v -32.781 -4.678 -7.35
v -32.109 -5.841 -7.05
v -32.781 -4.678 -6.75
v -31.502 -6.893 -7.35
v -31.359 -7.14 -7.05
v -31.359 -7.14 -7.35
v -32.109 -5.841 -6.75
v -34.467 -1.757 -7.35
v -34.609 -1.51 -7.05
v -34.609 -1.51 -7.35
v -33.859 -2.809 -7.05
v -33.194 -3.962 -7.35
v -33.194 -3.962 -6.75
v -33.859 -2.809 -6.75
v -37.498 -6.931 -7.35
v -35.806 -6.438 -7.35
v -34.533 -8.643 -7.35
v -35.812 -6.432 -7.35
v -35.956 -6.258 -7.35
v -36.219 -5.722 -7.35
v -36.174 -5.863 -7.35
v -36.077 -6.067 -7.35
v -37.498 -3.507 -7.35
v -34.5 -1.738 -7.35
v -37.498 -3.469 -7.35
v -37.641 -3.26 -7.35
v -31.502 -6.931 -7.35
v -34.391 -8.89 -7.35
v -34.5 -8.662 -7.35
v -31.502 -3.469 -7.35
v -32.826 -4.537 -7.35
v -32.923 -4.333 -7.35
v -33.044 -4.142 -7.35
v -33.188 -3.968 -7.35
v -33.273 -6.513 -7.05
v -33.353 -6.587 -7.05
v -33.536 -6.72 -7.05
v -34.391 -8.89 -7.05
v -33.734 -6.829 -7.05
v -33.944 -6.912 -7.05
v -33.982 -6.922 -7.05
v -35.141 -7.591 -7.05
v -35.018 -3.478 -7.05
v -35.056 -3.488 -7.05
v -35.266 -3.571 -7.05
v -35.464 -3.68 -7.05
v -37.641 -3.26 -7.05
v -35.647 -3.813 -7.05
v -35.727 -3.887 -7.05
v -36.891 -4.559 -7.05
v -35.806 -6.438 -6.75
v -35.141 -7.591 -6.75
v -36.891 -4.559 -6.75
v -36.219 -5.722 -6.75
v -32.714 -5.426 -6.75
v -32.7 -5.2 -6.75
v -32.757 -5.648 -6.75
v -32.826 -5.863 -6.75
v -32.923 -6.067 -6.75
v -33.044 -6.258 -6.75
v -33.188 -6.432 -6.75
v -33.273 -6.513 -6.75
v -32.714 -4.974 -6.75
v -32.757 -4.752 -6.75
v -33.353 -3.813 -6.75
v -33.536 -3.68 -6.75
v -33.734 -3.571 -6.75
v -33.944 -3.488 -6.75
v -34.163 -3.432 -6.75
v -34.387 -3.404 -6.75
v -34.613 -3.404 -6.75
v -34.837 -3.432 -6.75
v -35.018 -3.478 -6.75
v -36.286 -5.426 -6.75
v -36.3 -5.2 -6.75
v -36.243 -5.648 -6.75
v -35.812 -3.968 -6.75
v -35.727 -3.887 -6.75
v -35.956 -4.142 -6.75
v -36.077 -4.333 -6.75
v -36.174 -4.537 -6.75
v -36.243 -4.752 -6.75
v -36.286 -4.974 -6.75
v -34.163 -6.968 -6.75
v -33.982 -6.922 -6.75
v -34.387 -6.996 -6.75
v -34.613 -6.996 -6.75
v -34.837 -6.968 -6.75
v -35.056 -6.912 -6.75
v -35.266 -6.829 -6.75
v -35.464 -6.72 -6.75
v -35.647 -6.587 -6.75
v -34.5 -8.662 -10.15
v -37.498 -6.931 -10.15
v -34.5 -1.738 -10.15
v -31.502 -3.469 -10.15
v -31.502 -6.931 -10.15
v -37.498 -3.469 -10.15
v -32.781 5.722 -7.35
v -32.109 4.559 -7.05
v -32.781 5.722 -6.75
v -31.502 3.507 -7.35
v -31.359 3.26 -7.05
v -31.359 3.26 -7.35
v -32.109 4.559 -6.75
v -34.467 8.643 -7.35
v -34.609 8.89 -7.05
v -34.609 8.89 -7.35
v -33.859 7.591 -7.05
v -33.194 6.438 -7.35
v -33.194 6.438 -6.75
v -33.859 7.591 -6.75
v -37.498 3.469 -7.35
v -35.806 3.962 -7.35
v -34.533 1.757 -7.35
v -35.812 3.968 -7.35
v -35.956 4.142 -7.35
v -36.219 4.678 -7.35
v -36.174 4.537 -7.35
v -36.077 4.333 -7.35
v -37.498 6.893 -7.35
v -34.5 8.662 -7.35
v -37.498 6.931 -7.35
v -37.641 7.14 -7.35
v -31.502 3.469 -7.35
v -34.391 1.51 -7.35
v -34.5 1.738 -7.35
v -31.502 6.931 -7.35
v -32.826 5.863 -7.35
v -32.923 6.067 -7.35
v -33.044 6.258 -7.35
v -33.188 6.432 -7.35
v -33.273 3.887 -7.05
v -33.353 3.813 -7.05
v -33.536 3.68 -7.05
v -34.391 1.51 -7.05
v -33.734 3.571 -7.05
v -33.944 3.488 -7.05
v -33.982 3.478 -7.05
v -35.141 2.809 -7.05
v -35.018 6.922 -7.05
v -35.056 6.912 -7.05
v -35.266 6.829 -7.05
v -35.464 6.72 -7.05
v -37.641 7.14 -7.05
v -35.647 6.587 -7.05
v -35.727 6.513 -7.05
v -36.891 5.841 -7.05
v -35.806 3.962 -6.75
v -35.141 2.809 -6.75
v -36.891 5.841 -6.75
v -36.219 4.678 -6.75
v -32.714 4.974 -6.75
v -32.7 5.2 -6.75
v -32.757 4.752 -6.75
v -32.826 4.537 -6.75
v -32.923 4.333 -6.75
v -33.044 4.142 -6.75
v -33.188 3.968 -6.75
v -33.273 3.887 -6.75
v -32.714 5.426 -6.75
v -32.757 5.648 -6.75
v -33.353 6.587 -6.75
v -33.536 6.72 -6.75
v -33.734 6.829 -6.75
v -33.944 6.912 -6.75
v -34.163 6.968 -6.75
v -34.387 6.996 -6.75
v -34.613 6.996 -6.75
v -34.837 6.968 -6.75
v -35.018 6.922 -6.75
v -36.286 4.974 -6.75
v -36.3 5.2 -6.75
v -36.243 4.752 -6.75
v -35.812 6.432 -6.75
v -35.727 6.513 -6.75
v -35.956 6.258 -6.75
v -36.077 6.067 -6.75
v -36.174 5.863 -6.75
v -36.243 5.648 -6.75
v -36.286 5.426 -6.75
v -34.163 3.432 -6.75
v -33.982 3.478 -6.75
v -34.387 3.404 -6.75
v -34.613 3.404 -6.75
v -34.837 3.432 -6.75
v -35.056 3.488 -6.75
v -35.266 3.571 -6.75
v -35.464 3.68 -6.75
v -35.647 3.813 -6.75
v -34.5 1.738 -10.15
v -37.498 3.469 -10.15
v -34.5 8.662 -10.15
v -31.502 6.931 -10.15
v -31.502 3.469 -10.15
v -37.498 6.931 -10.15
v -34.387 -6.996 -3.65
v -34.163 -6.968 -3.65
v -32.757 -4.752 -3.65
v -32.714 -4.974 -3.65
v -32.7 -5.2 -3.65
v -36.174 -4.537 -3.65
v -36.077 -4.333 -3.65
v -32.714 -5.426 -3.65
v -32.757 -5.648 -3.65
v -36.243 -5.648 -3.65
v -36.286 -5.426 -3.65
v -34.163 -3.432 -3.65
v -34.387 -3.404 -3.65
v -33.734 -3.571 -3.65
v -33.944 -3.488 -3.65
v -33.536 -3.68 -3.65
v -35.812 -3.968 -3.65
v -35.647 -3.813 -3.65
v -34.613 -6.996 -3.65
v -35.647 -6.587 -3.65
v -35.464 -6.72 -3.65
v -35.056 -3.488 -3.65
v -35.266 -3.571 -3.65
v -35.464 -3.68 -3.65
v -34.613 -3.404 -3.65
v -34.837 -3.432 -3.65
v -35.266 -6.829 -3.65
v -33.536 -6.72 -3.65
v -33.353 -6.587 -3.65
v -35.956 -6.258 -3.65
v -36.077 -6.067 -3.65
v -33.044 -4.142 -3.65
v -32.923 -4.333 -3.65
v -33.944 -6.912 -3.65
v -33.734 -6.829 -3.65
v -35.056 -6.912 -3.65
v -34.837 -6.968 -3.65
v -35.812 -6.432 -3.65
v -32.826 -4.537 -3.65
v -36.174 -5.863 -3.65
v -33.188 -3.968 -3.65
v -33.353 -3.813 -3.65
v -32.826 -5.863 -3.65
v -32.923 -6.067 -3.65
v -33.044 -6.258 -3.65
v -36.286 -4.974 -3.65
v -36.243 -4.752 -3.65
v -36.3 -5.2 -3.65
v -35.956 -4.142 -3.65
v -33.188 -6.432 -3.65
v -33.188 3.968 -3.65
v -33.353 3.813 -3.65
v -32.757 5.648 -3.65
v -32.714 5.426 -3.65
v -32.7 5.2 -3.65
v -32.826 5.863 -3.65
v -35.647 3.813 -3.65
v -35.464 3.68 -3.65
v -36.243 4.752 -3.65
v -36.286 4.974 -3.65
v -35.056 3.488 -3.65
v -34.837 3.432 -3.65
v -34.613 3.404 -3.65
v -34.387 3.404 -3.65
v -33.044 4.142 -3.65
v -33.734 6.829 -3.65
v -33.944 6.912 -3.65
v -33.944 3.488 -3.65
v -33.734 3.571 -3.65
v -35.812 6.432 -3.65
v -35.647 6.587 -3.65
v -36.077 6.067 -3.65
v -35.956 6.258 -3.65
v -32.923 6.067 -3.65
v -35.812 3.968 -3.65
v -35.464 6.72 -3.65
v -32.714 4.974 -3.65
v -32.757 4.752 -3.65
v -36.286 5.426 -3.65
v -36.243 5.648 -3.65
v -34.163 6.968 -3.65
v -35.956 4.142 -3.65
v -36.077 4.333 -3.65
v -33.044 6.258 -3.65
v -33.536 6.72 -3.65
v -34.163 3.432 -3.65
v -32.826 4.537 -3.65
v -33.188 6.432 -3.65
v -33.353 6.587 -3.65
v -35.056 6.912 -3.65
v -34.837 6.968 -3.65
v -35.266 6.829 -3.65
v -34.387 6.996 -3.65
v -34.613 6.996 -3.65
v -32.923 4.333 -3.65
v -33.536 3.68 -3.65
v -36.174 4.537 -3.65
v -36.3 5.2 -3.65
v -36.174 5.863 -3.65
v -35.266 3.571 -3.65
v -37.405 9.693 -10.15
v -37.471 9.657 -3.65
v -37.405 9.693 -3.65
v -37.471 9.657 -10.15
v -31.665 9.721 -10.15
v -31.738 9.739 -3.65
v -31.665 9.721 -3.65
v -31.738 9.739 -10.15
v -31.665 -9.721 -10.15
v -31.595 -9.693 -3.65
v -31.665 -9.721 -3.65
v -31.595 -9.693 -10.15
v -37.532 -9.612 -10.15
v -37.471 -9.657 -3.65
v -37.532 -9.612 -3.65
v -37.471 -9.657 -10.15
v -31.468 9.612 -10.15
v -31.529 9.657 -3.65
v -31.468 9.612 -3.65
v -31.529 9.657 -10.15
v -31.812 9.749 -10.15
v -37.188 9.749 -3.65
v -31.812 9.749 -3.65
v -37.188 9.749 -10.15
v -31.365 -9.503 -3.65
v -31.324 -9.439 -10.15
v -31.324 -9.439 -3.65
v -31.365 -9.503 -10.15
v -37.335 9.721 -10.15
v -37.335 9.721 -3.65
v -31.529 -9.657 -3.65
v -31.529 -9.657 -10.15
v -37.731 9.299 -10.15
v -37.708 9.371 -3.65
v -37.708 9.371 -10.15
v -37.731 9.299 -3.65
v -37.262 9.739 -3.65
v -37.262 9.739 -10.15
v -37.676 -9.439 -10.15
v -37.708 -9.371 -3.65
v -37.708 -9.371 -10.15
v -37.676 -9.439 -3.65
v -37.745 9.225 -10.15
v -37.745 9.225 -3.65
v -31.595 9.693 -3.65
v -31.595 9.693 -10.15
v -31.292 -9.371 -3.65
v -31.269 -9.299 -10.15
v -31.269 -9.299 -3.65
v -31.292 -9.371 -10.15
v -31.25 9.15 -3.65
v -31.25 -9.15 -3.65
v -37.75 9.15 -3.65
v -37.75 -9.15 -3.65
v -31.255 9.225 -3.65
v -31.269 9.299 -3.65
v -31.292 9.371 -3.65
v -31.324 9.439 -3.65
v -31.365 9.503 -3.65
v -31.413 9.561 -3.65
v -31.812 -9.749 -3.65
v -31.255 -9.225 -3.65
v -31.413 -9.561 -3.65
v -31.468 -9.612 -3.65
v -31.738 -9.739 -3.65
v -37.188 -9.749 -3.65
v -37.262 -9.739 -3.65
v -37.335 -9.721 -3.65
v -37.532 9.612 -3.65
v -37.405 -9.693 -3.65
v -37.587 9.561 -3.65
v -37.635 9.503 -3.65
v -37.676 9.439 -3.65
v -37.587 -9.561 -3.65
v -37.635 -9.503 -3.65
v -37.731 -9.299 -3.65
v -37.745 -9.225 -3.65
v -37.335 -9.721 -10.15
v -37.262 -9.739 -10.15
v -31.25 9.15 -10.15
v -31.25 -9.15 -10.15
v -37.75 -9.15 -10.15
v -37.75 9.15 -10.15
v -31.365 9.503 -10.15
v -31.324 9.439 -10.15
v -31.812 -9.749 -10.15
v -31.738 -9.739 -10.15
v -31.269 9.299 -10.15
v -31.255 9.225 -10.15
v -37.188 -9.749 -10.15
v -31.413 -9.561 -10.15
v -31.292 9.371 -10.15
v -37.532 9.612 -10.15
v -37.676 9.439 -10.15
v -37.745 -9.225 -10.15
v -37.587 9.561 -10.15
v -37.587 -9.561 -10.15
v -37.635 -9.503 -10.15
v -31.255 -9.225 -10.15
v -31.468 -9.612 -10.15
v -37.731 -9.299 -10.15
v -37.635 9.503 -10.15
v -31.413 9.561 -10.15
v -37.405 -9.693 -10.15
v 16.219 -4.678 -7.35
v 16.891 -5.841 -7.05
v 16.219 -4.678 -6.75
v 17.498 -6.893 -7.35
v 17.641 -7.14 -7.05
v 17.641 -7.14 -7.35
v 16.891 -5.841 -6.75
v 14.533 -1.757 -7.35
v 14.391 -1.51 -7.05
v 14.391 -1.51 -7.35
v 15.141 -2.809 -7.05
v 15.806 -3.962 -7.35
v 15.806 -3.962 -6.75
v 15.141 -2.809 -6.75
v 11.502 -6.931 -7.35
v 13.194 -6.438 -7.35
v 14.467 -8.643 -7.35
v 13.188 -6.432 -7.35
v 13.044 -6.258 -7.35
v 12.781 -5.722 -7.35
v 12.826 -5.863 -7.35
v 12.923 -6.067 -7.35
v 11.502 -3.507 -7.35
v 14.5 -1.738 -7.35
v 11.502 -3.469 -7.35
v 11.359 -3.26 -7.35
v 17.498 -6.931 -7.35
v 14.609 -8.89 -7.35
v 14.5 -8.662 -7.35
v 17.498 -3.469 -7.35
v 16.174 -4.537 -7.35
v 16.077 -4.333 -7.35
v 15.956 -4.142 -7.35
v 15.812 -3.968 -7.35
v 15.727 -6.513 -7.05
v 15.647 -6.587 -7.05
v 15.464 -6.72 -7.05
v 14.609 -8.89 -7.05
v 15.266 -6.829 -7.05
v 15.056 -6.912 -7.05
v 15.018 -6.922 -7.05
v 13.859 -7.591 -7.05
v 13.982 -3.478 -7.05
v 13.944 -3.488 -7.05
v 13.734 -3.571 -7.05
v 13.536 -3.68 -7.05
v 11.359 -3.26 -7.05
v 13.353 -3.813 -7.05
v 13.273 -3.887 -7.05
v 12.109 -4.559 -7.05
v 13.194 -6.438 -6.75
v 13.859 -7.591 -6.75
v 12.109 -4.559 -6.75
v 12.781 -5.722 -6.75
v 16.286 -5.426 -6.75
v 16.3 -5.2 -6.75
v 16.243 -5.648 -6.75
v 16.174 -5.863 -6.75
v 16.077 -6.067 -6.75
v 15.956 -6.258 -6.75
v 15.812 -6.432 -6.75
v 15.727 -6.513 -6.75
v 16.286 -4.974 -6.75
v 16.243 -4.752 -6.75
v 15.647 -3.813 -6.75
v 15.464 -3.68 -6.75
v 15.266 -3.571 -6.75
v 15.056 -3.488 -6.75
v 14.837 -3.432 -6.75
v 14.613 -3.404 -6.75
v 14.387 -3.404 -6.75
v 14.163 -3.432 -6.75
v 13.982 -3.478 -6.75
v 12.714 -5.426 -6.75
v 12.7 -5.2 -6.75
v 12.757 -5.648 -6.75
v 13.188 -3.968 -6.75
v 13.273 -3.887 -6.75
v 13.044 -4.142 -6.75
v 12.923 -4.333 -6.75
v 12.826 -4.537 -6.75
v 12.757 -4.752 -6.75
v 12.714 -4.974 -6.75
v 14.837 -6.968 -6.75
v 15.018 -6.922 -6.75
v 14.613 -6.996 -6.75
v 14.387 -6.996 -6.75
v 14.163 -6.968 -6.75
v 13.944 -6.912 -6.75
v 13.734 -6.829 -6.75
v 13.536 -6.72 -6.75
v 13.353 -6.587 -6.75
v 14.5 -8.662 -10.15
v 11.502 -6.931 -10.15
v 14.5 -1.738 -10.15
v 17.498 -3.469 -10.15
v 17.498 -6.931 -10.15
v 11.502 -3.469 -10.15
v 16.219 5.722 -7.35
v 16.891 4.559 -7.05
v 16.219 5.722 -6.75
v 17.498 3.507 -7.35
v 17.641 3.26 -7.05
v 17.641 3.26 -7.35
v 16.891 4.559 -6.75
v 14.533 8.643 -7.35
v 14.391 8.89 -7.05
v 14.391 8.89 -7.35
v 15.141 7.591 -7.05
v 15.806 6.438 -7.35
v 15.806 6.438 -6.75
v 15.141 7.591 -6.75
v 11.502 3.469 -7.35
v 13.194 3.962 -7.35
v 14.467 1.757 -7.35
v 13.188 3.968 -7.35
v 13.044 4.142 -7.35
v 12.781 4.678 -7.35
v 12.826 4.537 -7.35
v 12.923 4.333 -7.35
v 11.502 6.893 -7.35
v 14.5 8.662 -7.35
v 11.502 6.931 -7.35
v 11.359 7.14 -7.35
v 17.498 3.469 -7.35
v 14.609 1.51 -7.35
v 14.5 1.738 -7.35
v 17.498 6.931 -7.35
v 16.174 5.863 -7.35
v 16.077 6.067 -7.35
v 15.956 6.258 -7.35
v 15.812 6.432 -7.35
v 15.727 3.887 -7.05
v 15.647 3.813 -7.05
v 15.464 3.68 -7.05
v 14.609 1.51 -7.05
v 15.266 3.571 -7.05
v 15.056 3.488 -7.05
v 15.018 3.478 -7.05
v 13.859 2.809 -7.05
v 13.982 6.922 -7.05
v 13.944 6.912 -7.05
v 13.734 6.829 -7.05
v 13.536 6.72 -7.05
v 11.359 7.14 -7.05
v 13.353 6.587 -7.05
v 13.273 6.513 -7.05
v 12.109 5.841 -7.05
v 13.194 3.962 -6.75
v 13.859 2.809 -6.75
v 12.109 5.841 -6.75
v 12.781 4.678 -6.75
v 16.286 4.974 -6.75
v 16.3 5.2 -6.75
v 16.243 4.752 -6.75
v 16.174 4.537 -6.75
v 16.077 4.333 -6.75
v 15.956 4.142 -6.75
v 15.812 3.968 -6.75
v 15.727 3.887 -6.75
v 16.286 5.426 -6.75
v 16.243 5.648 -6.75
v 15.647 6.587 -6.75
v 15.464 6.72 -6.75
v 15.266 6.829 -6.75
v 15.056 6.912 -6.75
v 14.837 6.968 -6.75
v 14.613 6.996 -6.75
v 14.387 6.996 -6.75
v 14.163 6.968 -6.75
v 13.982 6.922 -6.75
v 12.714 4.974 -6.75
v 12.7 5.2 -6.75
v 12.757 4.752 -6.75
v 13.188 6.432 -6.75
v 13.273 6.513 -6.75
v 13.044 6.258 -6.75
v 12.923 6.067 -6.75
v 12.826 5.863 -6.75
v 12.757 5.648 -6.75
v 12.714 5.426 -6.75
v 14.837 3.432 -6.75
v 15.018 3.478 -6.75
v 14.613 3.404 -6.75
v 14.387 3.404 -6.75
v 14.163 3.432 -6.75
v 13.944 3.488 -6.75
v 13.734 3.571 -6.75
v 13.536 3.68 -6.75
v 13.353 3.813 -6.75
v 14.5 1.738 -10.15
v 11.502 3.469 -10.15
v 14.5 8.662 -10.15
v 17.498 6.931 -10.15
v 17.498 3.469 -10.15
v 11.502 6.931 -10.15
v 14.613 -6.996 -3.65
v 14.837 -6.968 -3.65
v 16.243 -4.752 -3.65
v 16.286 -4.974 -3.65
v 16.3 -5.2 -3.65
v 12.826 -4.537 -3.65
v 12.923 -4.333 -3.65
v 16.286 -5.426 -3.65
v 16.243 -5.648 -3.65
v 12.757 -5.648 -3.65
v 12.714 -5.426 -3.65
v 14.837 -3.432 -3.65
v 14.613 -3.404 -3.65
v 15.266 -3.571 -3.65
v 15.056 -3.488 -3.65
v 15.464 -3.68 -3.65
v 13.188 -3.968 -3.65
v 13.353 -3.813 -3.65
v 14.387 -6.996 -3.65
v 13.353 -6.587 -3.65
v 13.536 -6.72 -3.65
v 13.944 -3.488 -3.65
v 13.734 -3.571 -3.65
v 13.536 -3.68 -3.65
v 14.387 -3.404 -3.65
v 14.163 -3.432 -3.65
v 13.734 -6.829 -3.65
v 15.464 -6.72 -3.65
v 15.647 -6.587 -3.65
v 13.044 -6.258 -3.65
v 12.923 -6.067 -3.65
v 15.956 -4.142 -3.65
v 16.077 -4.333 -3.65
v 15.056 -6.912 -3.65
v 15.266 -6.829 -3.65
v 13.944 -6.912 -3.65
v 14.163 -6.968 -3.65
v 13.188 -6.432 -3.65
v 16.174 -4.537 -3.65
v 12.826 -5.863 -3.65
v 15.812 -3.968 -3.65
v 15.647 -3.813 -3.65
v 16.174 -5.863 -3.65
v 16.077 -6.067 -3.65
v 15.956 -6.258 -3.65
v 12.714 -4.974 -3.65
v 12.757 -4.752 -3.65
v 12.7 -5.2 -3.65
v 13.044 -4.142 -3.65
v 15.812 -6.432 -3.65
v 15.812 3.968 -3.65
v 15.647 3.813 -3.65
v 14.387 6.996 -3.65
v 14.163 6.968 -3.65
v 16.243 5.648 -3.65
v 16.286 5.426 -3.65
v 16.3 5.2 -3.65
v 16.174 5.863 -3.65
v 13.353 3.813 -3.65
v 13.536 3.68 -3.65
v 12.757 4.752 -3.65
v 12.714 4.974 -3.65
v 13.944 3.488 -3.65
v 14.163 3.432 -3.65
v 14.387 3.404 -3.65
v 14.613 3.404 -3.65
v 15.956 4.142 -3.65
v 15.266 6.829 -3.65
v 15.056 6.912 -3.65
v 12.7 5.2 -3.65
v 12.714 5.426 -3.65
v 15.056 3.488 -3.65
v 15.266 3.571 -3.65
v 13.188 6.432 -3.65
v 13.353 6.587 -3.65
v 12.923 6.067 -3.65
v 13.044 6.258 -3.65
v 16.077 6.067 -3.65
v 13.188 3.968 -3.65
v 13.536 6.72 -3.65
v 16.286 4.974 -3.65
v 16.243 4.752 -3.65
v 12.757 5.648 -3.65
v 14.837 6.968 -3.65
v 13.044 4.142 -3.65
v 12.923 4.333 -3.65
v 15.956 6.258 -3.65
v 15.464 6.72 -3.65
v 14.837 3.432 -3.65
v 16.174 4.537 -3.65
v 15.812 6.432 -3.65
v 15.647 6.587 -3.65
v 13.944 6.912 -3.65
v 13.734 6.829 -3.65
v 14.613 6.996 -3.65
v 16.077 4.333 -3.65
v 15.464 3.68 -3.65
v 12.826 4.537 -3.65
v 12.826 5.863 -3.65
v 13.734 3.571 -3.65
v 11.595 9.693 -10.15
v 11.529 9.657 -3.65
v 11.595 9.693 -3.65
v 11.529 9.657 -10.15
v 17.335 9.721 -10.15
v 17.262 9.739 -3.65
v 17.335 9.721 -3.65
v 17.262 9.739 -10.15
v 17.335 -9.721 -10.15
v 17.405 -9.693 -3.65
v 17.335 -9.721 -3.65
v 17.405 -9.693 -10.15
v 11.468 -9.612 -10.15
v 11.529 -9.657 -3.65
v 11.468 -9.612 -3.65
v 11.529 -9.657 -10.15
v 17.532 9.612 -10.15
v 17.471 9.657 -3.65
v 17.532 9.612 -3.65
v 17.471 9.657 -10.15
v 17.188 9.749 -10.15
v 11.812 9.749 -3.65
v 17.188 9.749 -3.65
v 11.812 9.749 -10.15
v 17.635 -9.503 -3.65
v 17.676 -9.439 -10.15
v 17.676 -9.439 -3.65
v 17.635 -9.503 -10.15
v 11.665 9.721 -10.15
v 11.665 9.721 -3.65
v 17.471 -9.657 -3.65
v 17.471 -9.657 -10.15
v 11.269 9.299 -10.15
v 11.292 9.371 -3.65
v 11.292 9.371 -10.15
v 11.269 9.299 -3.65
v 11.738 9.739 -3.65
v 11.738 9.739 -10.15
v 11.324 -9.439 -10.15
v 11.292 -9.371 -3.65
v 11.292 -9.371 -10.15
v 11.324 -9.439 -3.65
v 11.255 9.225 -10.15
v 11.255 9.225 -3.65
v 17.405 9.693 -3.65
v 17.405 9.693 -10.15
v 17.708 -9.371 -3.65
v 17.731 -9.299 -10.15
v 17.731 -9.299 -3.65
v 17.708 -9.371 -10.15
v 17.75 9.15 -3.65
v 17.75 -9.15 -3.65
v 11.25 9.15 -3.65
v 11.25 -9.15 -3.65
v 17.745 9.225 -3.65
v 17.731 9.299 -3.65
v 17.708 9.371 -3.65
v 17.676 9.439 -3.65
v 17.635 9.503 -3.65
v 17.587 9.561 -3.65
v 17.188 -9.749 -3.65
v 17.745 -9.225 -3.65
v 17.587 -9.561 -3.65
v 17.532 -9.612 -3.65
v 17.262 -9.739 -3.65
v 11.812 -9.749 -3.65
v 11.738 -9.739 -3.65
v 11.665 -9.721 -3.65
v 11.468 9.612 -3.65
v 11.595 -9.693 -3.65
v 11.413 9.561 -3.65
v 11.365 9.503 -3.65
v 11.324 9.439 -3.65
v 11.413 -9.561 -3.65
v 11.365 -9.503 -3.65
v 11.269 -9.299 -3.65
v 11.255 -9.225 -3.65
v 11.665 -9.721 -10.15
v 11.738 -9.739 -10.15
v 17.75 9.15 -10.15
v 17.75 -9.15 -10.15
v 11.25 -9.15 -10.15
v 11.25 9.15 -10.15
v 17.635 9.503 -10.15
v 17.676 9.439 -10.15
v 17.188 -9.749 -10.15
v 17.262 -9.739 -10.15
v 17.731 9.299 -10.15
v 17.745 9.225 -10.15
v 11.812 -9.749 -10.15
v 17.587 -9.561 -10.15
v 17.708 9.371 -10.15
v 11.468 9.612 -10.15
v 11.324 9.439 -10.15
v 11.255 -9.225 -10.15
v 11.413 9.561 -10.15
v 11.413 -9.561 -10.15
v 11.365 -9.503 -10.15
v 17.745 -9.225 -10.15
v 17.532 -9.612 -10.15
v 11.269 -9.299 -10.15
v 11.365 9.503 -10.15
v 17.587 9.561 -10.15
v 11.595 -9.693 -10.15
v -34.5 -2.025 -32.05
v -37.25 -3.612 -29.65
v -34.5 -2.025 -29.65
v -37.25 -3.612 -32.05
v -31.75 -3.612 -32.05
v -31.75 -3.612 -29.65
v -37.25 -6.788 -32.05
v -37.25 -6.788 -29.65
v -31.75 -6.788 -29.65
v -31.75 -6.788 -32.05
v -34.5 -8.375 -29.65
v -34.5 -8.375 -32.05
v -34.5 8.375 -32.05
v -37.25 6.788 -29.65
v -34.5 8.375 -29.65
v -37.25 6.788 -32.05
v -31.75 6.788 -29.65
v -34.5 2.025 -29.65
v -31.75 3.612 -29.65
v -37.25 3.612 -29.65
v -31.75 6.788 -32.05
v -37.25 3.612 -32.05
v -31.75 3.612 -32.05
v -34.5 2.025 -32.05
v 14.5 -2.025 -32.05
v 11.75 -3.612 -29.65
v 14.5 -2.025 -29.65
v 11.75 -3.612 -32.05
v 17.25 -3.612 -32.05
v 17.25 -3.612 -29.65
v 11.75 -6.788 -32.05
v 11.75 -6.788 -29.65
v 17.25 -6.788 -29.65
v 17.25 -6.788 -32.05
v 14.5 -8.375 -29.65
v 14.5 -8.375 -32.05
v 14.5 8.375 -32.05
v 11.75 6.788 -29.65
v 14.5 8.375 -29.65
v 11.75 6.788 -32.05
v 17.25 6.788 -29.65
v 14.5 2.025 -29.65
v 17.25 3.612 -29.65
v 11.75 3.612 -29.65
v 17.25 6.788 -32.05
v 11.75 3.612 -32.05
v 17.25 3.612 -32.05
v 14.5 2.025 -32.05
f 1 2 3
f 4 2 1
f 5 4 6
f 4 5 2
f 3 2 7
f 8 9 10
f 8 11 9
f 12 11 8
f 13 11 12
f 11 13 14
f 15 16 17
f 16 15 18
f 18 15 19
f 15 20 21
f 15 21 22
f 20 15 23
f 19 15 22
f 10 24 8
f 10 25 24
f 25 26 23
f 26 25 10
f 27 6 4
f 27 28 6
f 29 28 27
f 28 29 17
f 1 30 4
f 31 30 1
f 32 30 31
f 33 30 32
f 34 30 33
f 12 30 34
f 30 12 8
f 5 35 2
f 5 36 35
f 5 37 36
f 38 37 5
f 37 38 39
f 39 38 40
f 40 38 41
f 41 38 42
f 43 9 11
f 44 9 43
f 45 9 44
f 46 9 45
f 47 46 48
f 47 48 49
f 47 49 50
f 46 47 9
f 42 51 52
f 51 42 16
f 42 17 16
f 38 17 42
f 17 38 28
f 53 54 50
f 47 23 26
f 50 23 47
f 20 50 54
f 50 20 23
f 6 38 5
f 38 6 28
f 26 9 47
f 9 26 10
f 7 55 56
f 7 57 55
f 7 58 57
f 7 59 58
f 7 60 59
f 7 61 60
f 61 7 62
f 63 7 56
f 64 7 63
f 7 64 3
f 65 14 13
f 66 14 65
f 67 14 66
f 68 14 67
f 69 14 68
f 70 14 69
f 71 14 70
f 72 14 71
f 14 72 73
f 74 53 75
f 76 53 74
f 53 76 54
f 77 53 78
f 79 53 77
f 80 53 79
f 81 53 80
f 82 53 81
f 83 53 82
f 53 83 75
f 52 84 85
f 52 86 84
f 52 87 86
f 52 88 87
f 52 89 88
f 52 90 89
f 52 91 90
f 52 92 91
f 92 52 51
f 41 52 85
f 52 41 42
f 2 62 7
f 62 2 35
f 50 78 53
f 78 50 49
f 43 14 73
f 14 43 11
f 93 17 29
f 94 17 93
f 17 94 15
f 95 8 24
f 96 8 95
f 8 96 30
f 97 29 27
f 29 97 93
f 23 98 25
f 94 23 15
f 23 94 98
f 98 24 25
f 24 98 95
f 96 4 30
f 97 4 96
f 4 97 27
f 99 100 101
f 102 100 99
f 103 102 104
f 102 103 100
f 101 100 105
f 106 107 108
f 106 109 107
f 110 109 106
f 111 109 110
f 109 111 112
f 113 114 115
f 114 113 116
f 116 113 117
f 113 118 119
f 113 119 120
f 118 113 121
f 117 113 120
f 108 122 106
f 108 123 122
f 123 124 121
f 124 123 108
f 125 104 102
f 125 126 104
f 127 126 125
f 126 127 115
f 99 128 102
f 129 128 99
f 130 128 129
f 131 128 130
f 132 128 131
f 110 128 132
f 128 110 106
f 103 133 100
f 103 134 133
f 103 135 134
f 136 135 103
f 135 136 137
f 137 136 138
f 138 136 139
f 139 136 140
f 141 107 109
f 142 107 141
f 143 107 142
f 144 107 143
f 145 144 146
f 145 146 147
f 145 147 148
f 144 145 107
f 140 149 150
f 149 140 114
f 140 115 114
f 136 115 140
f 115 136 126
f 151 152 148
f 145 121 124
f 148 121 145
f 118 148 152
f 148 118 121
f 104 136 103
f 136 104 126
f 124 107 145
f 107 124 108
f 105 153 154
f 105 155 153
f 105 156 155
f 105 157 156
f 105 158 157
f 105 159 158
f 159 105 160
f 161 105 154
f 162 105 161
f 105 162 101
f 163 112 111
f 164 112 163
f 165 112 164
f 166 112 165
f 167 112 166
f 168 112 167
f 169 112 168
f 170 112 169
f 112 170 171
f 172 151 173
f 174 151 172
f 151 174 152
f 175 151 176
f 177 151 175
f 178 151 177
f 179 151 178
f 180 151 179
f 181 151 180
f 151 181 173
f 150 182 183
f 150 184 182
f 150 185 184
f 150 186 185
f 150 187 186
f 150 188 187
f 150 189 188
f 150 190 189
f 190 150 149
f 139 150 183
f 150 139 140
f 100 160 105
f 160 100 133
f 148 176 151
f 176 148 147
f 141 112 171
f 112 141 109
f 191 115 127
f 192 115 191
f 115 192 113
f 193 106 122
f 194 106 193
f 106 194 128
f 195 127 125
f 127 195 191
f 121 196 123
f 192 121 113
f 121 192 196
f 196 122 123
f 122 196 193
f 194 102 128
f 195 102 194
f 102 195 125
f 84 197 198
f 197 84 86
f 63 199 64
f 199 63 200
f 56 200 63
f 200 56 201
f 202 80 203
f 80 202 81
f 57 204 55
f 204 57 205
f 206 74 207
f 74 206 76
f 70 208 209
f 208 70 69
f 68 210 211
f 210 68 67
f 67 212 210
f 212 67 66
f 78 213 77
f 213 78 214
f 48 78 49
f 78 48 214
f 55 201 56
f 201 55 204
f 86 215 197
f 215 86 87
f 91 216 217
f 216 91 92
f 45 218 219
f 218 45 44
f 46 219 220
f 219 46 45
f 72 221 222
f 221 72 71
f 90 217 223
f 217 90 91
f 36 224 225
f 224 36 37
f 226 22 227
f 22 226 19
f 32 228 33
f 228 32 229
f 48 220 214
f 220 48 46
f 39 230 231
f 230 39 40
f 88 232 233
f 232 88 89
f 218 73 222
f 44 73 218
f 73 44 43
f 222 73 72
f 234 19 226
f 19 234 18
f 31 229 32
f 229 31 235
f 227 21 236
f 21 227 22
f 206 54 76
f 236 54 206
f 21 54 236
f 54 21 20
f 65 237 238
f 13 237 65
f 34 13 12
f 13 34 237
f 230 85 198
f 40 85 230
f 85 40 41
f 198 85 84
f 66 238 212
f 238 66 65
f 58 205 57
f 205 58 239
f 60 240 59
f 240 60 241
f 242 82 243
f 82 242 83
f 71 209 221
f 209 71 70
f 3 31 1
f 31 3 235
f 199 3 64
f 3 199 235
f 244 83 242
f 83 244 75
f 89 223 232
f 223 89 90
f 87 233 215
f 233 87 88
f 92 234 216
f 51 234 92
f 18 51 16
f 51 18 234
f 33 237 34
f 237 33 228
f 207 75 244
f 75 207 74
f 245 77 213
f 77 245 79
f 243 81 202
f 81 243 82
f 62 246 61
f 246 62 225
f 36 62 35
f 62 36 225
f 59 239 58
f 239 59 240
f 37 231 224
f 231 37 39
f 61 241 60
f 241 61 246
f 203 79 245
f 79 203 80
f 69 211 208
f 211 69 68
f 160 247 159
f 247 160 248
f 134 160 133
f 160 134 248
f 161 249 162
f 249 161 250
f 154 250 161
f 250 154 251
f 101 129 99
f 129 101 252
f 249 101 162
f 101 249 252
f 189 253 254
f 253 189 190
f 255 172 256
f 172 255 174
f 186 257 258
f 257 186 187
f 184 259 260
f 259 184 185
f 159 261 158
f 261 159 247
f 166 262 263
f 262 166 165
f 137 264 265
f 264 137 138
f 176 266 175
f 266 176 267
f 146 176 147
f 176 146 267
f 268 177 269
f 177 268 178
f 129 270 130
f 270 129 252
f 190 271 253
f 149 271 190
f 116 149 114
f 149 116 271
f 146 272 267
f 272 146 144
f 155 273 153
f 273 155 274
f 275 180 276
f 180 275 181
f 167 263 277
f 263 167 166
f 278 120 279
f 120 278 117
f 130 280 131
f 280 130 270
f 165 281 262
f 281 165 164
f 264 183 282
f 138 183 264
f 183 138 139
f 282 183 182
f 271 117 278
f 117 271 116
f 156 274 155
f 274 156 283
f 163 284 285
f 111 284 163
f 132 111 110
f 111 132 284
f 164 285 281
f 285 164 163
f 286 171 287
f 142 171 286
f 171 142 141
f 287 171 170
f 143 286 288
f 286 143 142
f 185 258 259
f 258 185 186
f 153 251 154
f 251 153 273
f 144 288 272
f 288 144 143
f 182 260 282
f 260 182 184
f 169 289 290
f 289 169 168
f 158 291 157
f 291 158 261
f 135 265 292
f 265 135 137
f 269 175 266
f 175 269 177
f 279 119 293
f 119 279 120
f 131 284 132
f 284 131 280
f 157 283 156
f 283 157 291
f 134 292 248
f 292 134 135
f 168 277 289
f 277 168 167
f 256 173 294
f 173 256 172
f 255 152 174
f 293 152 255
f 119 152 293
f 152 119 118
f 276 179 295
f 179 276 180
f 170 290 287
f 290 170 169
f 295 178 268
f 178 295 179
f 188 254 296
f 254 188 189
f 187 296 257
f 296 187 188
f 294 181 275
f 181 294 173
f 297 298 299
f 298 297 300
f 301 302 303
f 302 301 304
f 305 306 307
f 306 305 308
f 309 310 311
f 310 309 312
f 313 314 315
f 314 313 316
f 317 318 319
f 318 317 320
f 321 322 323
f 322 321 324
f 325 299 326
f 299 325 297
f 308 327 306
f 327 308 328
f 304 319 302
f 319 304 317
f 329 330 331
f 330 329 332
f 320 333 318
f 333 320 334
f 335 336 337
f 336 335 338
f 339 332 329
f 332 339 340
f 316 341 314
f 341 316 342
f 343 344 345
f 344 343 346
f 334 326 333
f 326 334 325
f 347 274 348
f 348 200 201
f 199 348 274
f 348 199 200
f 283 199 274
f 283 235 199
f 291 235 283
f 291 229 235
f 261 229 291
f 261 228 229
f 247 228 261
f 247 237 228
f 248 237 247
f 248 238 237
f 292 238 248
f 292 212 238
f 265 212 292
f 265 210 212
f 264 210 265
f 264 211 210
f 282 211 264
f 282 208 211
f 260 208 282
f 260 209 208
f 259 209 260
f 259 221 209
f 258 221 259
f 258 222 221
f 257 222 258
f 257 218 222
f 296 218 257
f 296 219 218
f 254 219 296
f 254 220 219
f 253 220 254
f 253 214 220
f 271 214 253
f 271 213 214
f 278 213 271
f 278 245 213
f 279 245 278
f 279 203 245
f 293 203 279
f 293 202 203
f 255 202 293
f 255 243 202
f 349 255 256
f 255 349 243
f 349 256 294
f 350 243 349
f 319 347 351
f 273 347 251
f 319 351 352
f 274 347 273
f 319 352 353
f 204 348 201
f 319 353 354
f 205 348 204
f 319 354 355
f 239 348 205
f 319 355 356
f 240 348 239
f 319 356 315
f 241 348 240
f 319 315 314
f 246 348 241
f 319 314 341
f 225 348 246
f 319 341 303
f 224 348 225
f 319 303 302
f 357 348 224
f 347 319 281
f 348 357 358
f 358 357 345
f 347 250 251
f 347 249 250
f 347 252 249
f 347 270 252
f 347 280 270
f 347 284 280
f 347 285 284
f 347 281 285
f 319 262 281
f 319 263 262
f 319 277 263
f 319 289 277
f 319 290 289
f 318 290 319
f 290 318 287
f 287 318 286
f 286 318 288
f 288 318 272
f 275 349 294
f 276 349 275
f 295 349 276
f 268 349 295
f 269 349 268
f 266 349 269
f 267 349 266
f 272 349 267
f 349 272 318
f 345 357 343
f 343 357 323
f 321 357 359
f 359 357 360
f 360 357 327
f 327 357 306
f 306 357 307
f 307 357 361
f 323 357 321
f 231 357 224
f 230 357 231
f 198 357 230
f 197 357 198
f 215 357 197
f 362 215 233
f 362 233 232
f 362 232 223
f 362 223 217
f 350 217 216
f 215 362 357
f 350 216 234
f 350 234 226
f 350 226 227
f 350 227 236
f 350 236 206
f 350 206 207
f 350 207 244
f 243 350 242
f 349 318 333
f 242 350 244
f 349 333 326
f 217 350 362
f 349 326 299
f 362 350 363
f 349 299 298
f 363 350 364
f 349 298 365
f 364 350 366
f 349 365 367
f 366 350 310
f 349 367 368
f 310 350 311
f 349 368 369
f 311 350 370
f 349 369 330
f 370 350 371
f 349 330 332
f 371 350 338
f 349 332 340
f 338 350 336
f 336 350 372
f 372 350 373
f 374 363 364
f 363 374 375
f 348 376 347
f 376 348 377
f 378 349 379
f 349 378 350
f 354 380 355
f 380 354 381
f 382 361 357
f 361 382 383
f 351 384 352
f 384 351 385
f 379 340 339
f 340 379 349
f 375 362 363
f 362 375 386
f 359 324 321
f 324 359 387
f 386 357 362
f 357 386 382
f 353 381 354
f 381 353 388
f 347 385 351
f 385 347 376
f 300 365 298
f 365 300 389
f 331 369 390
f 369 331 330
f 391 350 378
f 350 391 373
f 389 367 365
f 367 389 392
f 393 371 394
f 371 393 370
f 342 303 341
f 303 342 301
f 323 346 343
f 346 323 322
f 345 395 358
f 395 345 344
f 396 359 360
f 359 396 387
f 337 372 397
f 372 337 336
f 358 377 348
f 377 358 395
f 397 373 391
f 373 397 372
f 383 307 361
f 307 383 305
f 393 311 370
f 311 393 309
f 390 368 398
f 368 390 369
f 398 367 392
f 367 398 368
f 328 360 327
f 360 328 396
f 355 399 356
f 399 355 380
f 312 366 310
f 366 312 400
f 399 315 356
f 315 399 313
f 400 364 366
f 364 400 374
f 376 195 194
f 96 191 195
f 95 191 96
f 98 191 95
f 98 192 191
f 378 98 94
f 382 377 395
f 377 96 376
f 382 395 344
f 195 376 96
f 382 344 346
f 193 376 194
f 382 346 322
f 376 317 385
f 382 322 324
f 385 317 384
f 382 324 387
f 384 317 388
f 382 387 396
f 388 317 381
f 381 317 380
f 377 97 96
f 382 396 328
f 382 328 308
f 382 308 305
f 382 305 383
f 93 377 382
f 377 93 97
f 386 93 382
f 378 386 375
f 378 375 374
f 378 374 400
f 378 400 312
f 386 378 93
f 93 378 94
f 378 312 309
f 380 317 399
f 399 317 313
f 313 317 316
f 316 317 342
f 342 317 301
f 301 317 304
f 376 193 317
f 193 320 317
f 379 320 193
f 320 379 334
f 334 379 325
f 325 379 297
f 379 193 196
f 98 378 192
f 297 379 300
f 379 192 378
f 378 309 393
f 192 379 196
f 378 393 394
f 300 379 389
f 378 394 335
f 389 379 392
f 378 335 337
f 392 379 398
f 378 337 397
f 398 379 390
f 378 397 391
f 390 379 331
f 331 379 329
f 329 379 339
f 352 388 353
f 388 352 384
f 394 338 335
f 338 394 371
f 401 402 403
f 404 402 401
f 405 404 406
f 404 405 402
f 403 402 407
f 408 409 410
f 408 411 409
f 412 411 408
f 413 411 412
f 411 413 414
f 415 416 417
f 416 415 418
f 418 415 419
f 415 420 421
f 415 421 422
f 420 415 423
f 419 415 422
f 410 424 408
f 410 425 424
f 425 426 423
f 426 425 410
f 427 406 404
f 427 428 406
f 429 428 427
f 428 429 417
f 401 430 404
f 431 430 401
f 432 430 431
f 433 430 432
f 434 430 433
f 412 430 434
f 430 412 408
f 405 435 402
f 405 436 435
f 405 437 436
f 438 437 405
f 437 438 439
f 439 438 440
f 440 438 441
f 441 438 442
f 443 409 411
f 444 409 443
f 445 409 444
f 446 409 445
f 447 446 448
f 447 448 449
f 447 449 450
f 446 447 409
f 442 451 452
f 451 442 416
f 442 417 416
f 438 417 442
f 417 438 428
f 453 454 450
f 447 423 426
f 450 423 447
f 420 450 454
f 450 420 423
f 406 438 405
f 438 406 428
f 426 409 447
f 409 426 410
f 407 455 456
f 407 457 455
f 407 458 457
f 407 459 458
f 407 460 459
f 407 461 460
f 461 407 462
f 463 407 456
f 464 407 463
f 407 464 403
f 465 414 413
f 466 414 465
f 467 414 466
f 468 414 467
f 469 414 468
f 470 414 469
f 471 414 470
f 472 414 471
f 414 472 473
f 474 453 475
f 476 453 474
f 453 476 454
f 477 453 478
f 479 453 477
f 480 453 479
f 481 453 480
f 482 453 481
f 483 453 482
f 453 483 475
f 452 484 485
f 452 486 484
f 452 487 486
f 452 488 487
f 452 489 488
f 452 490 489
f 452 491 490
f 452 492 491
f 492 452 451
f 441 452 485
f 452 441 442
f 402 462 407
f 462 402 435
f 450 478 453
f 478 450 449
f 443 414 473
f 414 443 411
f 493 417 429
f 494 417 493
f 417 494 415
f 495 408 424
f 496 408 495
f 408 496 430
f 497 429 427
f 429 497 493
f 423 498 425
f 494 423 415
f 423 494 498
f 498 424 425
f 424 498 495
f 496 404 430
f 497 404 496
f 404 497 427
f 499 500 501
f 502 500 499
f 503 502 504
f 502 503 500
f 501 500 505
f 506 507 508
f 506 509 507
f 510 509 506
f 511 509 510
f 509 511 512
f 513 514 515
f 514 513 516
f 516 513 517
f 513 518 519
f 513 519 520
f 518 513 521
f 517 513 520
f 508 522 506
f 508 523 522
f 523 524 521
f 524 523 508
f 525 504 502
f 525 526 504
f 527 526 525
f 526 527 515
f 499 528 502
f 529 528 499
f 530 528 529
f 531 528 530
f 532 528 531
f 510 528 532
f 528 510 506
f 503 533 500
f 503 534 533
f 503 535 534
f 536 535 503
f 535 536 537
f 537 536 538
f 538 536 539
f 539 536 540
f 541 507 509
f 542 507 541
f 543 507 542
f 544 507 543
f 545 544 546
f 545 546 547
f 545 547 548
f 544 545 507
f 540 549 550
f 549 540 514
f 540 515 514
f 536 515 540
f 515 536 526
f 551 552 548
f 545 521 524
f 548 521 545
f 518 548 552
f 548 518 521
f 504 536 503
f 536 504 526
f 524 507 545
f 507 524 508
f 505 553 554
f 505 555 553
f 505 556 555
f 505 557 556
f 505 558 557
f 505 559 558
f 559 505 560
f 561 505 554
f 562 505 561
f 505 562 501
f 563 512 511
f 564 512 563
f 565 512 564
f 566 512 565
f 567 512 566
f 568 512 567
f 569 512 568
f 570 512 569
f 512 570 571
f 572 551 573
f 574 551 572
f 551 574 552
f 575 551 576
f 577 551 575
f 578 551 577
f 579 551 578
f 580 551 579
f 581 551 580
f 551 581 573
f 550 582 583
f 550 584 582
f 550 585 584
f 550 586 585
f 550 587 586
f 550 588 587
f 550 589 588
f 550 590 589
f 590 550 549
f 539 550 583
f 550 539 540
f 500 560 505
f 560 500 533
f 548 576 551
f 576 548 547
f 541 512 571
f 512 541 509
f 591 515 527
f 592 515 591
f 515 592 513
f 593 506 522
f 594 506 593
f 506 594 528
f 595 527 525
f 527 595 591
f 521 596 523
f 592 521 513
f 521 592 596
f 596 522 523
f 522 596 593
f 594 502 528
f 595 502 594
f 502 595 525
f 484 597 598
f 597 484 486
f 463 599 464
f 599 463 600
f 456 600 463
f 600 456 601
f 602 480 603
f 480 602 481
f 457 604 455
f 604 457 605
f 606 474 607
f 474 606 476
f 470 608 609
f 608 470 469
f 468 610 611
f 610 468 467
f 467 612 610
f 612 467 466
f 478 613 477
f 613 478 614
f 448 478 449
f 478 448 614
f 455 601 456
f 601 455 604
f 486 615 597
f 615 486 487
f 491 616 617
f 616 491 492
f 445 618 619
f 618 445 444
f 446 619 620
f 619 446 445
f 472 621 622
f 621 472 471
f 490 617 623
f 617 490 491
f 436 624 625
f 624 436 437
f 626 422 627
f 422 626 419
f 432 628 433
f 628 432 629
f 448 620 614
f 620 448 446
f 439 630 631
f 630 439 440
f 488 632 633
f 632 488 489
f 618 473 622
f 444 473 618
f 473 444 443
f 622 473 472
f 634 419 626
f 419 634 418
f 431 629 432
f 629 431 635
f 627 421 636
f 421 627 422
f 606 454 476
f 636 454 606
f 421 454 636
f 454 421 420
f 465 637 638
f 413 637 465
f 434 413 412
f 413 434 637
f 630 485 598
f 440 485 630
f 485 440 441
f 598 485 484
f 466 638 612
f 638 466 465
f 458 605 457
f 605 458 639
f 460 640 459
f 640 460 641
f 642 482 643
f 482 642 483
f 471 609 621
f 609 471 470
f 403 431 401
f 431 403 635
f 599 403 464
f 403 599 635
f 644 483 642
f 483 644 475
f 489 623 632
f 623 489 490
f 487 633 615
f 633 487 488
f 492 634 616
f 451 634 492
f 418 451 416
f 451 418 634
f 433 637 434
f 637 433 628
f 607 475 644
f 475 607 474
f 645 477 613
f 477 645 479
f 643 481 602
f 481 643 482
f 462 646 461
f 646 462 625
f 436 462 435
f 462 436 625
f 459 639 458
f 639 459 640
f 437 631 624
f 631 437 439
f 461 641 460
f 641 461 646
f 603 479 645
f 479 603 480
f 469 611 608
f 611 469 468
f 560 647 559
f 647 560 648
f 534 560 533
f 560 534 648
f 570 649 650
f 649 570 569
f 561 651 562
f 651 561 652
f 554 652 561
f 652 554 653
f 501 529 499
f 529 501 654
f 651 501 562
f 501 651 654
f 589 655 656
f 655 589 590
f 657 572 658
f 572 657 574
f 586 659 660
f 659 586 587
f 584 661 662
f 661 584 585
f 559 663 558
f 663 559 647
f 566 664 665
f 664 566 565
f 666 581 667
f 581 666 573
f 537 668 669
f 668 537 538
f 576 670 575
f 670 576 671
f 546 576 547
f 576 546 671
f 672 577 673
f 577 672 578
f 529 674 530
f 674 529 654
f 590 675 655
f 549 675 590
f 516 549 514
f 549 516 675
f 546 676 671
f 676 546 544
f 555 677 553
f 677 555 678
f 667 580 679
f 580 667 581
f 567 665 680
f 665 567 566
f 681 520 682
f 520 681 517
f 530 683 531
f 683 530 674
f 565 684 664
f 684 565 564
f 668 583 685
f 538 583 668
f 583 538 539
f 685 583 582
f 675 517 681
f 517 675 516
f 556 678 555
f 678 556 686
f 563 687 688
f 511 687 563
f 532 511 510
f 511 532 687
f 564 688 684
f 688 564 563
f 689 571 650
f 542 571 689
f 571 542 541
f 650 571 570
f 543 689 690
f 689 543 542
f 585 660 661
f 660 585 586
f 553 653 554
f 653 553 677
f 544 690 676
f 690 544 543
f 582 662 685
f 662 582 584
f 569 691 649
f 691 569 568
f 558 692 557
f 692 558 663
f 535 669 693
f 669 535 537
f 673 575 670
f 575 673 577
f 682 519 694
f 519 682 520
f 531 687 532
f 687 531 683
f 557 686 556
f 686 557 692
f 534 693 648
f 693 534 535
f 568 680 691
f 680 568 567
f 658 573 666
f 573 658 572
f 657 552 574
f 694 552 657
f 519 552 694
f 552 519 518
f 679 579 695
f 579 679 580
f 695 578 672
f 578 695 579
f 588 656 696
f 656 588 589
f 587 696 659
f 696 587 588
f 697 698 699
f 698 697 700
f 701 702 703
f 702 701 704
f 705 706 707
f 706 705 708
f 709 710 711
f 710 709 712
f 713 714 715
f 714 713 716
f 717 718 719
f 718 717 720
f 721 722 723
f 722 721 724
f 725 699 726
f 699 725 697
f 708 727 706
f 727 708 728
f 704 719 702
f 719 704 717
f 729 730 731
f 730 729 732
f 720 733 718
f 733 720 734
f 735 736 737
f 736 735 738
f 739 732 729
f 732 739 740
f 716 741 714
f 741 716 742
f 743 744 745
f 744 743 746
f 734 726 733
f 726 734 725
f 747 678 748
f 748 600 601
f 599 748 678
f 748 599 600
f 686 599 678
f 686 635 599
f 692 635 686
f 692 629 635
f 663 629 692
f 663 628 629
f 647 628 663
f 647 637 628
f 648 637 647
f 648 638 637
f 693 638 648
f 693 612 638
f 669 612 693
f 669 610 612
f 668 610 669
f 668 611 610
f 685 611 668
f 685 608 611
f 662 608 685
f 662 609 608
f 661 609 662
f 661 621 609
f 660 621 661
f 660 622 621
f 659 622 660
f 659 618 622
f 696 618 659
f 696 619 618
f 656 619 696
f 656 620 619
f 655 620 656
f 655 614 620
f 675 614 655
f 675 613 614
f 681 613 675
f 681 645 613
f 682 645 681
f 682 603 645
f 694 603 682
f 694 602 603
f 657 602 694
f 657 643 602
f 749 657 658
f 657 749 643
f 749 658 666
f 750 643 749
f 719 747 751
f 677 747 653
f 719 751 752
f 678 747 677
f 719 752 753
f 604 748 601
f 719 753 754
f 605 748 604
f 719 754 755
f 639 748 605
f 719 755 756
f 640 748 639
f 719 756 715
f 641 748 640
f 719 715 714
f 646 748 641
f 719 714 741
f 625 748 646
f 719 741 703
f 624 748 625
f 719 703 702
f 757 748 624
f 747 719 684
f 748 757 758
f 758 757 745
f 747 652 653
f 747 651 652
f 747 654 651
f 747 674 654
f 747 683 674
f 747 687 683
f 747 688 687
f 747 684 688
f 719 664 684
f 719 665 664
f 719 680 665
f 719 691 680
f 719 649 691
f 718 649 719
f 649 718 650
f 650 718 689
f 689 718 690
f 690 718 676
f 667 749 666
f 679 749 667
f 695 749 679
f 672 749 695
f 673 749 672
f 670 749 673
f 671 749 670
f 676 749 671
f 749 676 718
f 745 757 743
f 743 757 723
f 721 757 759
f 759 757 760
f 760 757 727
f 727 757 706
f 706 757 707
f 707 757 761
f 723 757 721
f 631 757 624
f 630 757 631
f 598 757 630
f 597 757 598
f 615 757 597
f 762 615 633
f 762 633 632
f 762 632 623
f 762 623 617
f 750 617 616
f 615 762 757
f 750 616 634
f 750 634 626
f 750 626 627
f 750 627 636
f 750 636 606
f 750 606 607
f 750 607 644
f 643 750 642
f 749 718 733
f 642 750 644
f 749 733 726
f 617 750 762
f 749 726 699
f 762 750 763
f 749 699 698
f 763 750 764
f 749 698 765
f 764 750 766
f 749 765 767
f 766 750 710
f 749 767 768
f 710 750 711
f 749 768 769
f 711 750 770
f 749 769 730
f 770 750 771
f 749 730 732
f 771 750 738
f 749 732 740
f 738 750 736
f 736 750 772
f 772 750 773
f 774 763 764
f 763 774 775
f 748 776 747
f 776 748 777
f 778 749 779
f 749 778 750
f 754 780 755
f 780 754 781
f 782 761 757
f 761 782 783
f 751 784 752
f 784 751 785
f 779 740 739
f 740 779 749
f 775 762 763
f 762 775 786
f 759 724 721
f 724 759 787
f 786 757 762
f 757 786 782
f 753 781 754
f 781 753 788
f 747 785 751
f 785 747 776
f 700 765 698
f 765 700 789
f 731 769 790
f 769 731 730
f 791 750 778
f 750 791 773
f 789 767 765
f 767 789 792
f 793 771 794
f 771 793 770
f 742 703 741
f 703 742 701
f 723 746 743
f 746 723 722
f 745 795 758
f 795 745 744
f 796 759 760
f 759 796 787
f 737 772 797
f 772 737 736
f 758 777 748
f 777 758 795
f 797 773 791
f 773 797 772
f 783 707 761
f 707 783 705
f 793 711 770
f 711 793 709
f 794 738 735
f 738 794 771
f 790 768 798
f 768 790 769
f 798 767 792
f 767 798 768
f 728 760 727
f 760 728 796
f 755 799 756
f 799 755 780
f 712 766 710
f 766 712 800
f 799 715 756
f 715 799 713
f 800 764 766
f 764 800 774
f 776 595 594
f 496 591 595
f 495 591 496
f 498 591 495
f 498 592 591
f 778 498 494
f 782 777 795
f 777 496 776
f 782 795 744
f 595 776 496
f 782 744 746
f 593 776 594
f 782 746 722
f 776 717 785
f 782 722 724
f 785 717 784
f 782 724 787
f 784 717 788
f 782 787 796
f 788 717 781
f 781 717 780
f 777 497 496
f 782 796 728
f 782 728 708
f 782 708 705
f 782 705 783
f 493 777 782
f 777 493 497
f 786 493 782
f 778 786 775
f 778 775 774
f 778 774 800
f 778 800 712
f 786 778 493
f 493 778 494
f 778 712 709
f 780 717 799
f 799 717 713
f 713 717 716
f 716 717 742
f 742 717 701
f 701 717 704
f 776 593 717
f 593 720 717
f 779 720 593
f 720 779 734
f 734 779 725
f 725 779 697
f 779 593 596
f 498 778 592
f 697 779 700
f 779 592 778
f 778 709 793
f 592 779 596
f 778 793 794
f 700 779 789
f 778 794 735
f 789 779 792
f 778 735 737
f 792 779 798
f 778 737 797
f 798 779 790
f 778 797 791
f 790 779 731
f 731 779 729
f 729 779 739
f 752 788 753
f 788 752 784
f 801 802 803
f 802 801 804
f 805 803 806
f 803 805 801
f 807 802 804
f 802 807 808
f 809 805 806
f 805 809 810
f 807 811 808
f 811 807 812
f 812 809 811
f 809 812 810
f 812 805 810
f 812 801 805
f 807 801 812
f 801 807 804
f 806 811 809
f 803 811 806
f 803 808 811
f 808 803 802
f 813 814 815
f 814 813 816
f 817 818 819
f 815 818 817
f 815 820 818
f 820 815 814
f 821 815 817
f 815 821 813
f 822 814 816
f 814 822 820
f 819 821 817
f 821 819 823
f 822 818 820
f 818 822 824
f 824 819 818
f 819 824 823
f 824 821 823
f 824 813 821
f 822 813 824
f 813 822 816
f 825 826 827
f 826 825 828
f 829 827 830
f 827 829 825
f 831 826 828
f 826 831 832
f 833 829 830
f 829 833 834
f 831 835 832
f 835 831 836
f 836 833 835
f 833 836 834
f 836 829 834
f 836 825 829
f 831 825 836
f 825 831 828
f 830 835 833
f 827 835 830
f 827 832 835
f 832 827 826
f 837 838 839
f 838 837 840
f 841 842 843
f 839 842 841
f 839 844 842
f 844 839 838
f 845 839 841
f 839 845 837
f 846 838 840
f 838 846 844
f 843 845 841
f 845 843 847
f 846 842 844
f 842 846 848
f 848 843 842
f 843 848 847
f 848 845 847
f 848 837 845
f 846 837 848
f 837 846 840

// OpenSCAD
$fn = 50;

difference() {
	union() {
		translate(v = [0, 0, 0]) {
			rotate(a = [0, 0, 0]) {
				difference() {
					union() {
						translate(v = [-34.5, 0, -10.15]) {
							hull() {
								translate(v = [-2.65, 9.15, 0]) {
									cylinder(h = 6.5, r = 0.6);
								}
								translate(v = [2.65, 9.15, 0]) {
									cylinder(h = 6.5, r = 0.6);
								}
								translate(v = [-2.65, -9.15, 0]) {
									cylinder(h = 6.5, r = 0.6);
								}
								translate(v = [2.65, -9.15, 0]) {
									cylinder(h = 6.5, r = 0.6);
								}
							}
						}
					}
					union() {
						translate(v = [-34.5, -5.2, -7.3500000000000005]) {
							rotate(a = [180, 0, 30]) {
								difference() {
									union() {
										translate(v = [-1.75, -3.25, -0.3]) {
											cube(size = [3.5, 6.5, 0.3]);
										}
										translate(v = [-1.75, -1.75, -0.6]) {
											cube(size = [3.5, 3.5, 0.3]);
										}
										translate(v = [-1.75, -3.25, 52.8]) {
											cube(size = [3.5, 6.5, 0.3]);
										}
										translate(v = [-1.75, -1.75, 53.099999999999994]) {
											cube(size = [3.5, 3.5, 0.3]);
										}
										linear_extrude(height = 102.8) {
											polygon(points = [[3.4619999999999997, 0.0], [1.7310000000000003, 2.9981799479017264], [-1.7309999999999992, 2.9981799479017264], [-3.4619999999999997, 4.2397272186481365e-16], [-1.7310000000000014, -2.998179947901726], [1.7309999999999977, -2.9981799479017277]]);
										}
										translate(v = [-1.75, -3.25, -0.3]) {
											cube(size = [3.5, 6.5, 0.3]);
										}
										translate(v = [-1.75, -1.75, -0.6]) {
											cube(size = [3.5, 3.5, 0.3]);
										}
										translate(v = [-1.75, -3.25, 102.8]) {
											cube(size = [3.5, 6.5, 0.3]);
										}
										translate(v = [-1.75, -1.75, 103.1]) {
											cube(size = [3.5, 3.5, 0.3]);
										}
										translate(v = [-1.75, -3.25, -0.3]) {
											cube(size = [3.5, 6.5, 0.3]);
										}
										translate(v = [-1.75, -1.75, -0.6]) {
											cube(size = [3.5, 3.5, 0.3]);
										}
										translate(v = [-1.75, -3.25, 152.8]) {
											cube(size = [3.5, 6.5, 0.3]);
										}
										translate(v = [-1.75, -1.75, 153.10000000000002]) {
											cube(size = [3.5, 3.5, 0.3]);
										}
									}
									union();
								}
							}
						}
						translate(v = [-34.5, 5.2, -7.3500000000000005]) {
							rotate(a = [180, 0, 30]) {
								difference() {
									union() {
										translate(v = [-1.75, -3.25, -0.3]) {
											cube(size = [3.5, 6.5, 0.3]);
										}
										translate(v = [-1.75, -1.75, -0.6]) {
											cube(size = [3.5, 3.5, 0.3]);
										}
										translate(v = [-1.75, -3.25, 52.8]) {
											cube(size = [3.5, 6.5, 0.3]);
										}
										translate(v = [-1.75, -1.75, 53.099999999999994]) {
											cube(size = [3.5, 3.5, 0.3]);
										}
										linear_extrude(height = 102.8) {
											polygon(points = [[3.4619999999999997, 0.0], [1.7310000000000003, 2.9981799479017264], [-1.7309999999999992, 2.9981799479017264], [-3.4619999999999997, 4.2397272186481365e-16], [-1.7310000000000014, -2.998179947901726], [1.7309999999999977, -2.9981799479017277]]);
										}
										translate(v = [-1.75, -3.25, -0.3]) {
											cube(size = [3.5, 6.5, 0.3]);
										}
										translate(v = [-1.75, -1.75, -0.6]) {
											cube(size = [3.5, 3.5, 0.3]);
										}
										translate(v = [-1.75, -3.25, 102.8]) {
											cube(size = [3.5, 6.5, 0.3]);
										}
										translate(v = [-1.75, -1.75, 103.1]) {
											cube(size = [3.5, 3.5, 0.3]);
										}
										translate(v = [-1.75, -3.25, -0.3]) {
											cube(size = [3.5, 6.5, 0.3]);
										}
										translate(v = [-1.75, -1.75, -0.6]) {
											cube(size = [3.5, 3.5, 0.3]);
										}
										translate(v = [-1.75, -3.25, 152.8]) {
											cube(size = [3.5, 6.5, 0.3]);
										}
										translate(v = [-1.75, -1.75, 153.10000000000002]) {
											cube(size = [3.5, 3.5, 0.3]);
										}
									}
									union();
								}
							}
						}
						translate(v = [-34.5, -5.2, -11.15]) {
							cylinder(h = 8.5, r = 1.8);
						}
						translate(v = [-34.5, 5.2, -11.15]) {
							cylinder(h = 8.5, r = 1.8);
						}
					}
				}
			}
		}
		translate(v = [0, 0, 0]) {
			rotate(a = [0, 0, 0]) {
				difference() {
					union() {
						translate(v = [14.5, 0, -10.15]) {
							hull() {
								translate(v = [-2.65, 9.15, 0]) {
									cylinder(h = 6.5, r = 0.6);
								}
								translate(v = [2.65, 9.15, 0]) {
									cylinder(h = 6.5, r = 0.6);
								}
								translate(v = [-2.65, -9.15, 0]) {
									cylinder(h = 6.5, r = 0.6);
								}
								translate(v = [2.65, -9.15, 0]) {
									cylinder(h = 6.5, r = 0.6);
								}
							}
						}
					}
					union() {
						translate(v = [14.5, -5.2, -7.3500000000000005]) {
							rotate(a = [180, 0, 30]) {
								difference() {
									union() {
										translate(v = [-1.75, -3.25, -0.3]) {
											cube(size = [3.5, 6.5, 0.3]);
										}
										translate(v = [-1.75, -1.75, -0.6]) {
											cube(size = [3.5, 3.5, 0.3]);
										}
										translate(v = [-1.75, -3.25, 52.8]) {
											cube(size = [3.5, 6.5, 0.3]);
										}
										translate(v = [-1.75, -1.75, 53.099999999999994]) {
											cube(size = [3.5, 3.5, 0.3]);
										}
										linear_extrude(height = 102.8) {
											polygon(points = [[3.4619999999999997, 0.0], [1.7310000000000003, 2.9981799479017264], [-1.7309999999999992, 2.9981799479017264], [-3.4619999999999997, 4.2397272186481365e-16], [-1.7310000000000014, -2.998179947901726], [1.7309999999999977, -2.9981799479017277]]);
										}
										translate(v = [-1.75, -3.25, -0.3]) {
											cube(size = [3.5, 6.5, 0.3]);
										}
										translate(v = [-1.75, -1.75, -0.6]) {
											cube(size = [3.5, 3.5, 0.3]);
										}
										translate(v = [-1.75, -3.25, 102.8]) {
											cube(size = [3.5, 6.5, 0.3]);
										}
										translate(v = [-1.75, -1.75, 103.1]) {
											cube(size = [3.5, 3.5, 0.3]);
										}
										translate(v = [-1.75, -3.25, -0.3]) {
											cube(size = [3.5, 6.5, 0.3]);
										}
										translate(v = [-1.75, -1.75, -0.6]) {
											cube(size = [3.5, 3.5, 0.3]);
										}
										translate(v = [-1.75, -3.25, 152.8]) {
											cube(size = [3.5, 6.5, 0.3]);
										}
										translate(v = [-1.75, -1.75, 153.10000000000002]) {
											cube(size = [3.5, 3.5, 0.3]);
										}
									}
									union();
								}
							}
						}
						translate(v = [14.5, 5.2, -7.3500000000000005]) {
							rotate(a = [180, 0, 30]) {
								difference() {
									union() {
										translate(v = [-1.75, -3.25, -0.3]) {
											cube(size = [3.5, 6.5, 0.3]);
										}
										translate(v = [-1.75, -1.75, -0.6]) {
											cube(size = [3.5, 3.5, 0.3]);
										}
										translate(v = [-1.75, -3.25, 52.8]) {
											cube(size = [3.5, 6.5, 0.3]);
										}
										translate(v = [-1.75, -1.75, 53.099999999999994]) {
											cube(size = [3.5, 3.5, 0.3]);
										}
										linear_extrude(height = 102.8) {
											polygon(points = [[3.4619999999999997, 0.0], [1.7310000000000003, 2.9981799479017264], [-1.7309999999999992, 2.9981799479017264], [-3.4619999999999997, 4.2397272186481365e-16], [-1.7310000000000014, -2.998179947901726], [1.7309999999999977, -2.9981799479017277]]);
										}
										translate(v = [-1.75, -3.25, -0.3]) {
											cube(size = [3.5, 6.5, 0.3]);
										}
										translate(v = [-1.75, -1.75, -0.6]) {
											cube(size = [3.5, 3.5, 0.3]);
										}
										translate(v = [-1.75, -3.25, 102.8]) {
											cube(size = [3.5, 6.5, 0.3]);
										}
										translate(v = [-1.75, -1.75, 103.1]) {
											cube(size = [3.5, 3.5, 0.3]);
										}
										translate(v = [-1.75, -3.25, -0.3]) {
											cube(size = [3.5, 6.5, 0.3]);
										}
										translate(v = [-1.75, -1.75, -0.6]) {
											cube(size = [3.5, 3.5, 0.3]);
										}
										translate(v = [-1.75, -3.25, 152.8]) {
											cube(size = [3.5, 6.5, 0.3]);
										}
										translate(v = [-1.75, -1.75, 153.10000000000002]) {
											cube(size = [3.5, 3.5, 0.3]);
										}
									}
									union();
								}
							}
						}
						translate(v = [14.5, -5.2, -11.15]) {
							cylinder(h = 8.5, r = 1.8);
						}
						translate(v = [14.5, 5.2, -11.15]) {
							cylinder(h = 8.5, r = 1.8);
						}
					}
				}
			}
		}
		translate(v = [0, 0, 0]) {
			rotate(a = [0, 0, 0]) {
				difference() {
					union() {
						translate(v = [-34.5, -5.2, -32.05]) {
							rotate(a = [0, 0, 30]) {
								linear_extrude(height = 2.4) {
									polygon(points = [[3.1754264805429417, 0.0], [1.5877132402714713, 2.75], [-1.5877132402714702, 2.7500000000000004], [-3.1754264805429417, 3.888775875324659e-16], [-1.5877132402714722, -2.7499999999999996], [1.5877132402714687, -2.7500000000000013]]);
								}
							}
						}
						translate(v = [-34.5, 5.2, -32.05]) {
							rotate(a = [0, 0, 30]) {
								linear_extrude(height = 2.4) {
									polygon(points = [[3.1754264805429417, 0.0], [1.5877132402714713, 2.75], [-1.5877132402714702, 2.7500000000000004], [-3.1754264805429417, 3.888775875324659e-16], [-1.5877132402714722, -2.7499999999999996], [1.5877132402714687, -2.7500000000000013]]);
								}
							}
						}
						translate(v = [14.5, -5.2, -32.05]) {
							rotate(a = [0, 0, 30]) {
								linear_extrude(height = 2.4) {
									polygon(points = [[3.1754264805429417, 0.0], [1.5877132402714713, 2.75], [-1.5877132402714702, 2.7500000000000004], [-3.1754264805429417, 3.888775875324659e-16], [-1.5877132402714722, -2.7499999999999996], [1.5877132402714687, -2.7500000000000013]]);
								}
							}
						}
						translate(v = [14.5, 5.2, -32.05]) {
							rotate(a = [0, 0, 30]) {
								linear_extrude(height = 2.4) {
									polygon(points = [[3.1754264805429417, 0.0], [1.5877132402714713, 2.75], [-1.5877132402714702, 2.7500000000000004], [-3.1754264805429417, 3.888775875324659e-16], [-1.5877132402714722, -2.7499999999999996], [1.5877132402714687, -2.7500000000000013]]);
								}
							}
						}
					}
					union();
				}
			}
		}
	}
	union();
}
